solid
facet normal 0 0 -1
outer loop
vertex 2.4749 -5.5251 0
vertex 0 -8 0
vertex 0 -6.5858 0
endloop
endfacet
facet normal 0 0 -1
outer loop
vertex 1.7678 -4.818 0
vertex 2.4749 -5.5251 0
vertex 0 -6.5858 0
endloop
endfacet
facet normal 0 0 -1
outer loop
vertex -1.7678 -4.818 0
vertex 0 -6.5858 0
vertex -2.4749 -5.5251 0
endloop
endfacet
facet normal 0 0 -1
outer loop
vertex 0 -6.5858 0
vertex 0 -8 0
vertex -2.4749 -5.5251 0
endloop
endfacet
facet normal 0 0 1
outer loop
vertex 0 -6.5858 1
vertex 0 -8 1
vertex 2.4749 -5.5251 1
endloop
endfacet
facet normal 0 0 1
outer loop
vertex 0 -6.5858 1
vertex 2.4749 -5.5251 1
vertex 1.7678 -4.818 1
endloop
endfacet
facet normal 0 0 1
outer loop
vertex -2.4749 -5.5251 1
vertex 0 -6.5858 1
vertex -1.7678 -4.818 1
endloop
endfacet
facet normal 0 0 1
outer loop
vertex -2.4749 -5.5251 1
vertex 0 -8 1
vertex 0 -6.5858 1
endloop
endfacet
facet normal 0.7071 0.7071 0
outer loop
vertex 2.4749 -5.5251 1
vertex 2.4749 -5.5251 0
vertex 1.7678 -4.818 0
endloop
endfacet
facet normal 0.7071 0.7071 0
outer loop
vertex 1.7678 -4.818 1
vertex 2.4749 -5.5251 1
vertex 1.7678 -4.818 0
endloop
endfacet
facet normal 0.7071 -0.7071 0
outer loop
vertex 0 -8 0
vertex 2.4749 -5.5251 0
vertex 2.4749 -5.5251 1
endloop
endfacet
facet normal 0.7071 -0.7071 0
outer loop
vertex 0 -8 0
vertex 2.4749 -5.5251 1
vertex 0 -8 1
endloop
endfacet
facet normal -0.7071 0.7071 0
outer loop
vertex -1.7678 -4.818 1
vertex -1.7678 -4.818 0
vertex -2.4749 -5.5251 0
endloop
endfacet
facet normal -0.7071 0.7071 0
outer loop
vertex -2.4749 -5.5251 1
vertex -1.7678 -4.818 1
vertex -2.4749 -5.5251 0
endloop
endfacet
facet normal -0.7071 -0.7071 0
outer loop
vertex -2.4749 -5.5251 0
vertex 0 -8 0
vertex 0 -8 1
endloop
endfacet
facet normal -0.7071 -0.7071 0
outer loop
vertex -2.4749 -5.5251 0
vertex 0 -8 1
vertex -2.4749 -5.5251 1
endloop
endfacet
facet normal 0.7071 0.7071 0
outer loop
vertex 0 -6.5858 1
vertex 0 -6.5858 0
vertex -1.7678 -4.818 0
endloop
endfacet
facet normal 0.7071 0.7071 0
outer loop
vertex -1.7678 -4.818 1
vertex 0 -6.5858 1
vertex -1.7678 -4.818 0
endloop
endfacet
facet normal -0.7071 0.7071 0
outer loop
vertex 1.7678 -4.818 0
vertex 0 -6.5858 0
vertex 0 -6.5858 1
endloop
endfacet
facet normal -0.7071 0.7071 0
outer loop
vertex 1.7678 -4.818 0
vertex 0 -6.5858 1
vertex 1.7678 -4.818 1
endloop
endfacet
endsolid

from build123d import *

# Parameters (mm, degrees)
BOX177_W                  = 3.5
BOX177_H                  = 1
BOX177_DEPTH              = 1
BOX176_W                  = 3.5
BOX176_H                  = 1
BOX176_DEPTH              = 1
FUSION034_PLACEMENT_ANGLE = 45


with BuildPart() as cube145:
    # Box177 → Box177 (new body)
    with BuildSketch(Plane.XY):
        with Locations((1.75, 0.5)):
            Rectangle(BOX177_W, BOX177_H)
    extrude(amount=BOX177_DEPTH)


with BuildPart() as smallarrowled010:
    # Box176 → Box176 (new body)
    with BuildSketch(Plane(origin=(1, 0, 0), x_dir=(0, 1, 0), z_dir=(0, 0, 1))):
        with Locations((1.75, 0.5)):
            Rectangle(BOX176_W, BOX176_H)
    extrude(amount=BOX176_DEPTH)

    # Fusion034: union Cube145
    add(cube145.part)


with BuildPart() as smallarrowled010_1:
    # Fusion034 placement: moved
    add(smallarrowled010.part.moved(Location((0, -8, 0))).rotate(Axis((0, -8, 0), (0, 0, 1)), FUSION034_PLACEMENT_ANGLE))


solid = smallarrowled010_1.part
